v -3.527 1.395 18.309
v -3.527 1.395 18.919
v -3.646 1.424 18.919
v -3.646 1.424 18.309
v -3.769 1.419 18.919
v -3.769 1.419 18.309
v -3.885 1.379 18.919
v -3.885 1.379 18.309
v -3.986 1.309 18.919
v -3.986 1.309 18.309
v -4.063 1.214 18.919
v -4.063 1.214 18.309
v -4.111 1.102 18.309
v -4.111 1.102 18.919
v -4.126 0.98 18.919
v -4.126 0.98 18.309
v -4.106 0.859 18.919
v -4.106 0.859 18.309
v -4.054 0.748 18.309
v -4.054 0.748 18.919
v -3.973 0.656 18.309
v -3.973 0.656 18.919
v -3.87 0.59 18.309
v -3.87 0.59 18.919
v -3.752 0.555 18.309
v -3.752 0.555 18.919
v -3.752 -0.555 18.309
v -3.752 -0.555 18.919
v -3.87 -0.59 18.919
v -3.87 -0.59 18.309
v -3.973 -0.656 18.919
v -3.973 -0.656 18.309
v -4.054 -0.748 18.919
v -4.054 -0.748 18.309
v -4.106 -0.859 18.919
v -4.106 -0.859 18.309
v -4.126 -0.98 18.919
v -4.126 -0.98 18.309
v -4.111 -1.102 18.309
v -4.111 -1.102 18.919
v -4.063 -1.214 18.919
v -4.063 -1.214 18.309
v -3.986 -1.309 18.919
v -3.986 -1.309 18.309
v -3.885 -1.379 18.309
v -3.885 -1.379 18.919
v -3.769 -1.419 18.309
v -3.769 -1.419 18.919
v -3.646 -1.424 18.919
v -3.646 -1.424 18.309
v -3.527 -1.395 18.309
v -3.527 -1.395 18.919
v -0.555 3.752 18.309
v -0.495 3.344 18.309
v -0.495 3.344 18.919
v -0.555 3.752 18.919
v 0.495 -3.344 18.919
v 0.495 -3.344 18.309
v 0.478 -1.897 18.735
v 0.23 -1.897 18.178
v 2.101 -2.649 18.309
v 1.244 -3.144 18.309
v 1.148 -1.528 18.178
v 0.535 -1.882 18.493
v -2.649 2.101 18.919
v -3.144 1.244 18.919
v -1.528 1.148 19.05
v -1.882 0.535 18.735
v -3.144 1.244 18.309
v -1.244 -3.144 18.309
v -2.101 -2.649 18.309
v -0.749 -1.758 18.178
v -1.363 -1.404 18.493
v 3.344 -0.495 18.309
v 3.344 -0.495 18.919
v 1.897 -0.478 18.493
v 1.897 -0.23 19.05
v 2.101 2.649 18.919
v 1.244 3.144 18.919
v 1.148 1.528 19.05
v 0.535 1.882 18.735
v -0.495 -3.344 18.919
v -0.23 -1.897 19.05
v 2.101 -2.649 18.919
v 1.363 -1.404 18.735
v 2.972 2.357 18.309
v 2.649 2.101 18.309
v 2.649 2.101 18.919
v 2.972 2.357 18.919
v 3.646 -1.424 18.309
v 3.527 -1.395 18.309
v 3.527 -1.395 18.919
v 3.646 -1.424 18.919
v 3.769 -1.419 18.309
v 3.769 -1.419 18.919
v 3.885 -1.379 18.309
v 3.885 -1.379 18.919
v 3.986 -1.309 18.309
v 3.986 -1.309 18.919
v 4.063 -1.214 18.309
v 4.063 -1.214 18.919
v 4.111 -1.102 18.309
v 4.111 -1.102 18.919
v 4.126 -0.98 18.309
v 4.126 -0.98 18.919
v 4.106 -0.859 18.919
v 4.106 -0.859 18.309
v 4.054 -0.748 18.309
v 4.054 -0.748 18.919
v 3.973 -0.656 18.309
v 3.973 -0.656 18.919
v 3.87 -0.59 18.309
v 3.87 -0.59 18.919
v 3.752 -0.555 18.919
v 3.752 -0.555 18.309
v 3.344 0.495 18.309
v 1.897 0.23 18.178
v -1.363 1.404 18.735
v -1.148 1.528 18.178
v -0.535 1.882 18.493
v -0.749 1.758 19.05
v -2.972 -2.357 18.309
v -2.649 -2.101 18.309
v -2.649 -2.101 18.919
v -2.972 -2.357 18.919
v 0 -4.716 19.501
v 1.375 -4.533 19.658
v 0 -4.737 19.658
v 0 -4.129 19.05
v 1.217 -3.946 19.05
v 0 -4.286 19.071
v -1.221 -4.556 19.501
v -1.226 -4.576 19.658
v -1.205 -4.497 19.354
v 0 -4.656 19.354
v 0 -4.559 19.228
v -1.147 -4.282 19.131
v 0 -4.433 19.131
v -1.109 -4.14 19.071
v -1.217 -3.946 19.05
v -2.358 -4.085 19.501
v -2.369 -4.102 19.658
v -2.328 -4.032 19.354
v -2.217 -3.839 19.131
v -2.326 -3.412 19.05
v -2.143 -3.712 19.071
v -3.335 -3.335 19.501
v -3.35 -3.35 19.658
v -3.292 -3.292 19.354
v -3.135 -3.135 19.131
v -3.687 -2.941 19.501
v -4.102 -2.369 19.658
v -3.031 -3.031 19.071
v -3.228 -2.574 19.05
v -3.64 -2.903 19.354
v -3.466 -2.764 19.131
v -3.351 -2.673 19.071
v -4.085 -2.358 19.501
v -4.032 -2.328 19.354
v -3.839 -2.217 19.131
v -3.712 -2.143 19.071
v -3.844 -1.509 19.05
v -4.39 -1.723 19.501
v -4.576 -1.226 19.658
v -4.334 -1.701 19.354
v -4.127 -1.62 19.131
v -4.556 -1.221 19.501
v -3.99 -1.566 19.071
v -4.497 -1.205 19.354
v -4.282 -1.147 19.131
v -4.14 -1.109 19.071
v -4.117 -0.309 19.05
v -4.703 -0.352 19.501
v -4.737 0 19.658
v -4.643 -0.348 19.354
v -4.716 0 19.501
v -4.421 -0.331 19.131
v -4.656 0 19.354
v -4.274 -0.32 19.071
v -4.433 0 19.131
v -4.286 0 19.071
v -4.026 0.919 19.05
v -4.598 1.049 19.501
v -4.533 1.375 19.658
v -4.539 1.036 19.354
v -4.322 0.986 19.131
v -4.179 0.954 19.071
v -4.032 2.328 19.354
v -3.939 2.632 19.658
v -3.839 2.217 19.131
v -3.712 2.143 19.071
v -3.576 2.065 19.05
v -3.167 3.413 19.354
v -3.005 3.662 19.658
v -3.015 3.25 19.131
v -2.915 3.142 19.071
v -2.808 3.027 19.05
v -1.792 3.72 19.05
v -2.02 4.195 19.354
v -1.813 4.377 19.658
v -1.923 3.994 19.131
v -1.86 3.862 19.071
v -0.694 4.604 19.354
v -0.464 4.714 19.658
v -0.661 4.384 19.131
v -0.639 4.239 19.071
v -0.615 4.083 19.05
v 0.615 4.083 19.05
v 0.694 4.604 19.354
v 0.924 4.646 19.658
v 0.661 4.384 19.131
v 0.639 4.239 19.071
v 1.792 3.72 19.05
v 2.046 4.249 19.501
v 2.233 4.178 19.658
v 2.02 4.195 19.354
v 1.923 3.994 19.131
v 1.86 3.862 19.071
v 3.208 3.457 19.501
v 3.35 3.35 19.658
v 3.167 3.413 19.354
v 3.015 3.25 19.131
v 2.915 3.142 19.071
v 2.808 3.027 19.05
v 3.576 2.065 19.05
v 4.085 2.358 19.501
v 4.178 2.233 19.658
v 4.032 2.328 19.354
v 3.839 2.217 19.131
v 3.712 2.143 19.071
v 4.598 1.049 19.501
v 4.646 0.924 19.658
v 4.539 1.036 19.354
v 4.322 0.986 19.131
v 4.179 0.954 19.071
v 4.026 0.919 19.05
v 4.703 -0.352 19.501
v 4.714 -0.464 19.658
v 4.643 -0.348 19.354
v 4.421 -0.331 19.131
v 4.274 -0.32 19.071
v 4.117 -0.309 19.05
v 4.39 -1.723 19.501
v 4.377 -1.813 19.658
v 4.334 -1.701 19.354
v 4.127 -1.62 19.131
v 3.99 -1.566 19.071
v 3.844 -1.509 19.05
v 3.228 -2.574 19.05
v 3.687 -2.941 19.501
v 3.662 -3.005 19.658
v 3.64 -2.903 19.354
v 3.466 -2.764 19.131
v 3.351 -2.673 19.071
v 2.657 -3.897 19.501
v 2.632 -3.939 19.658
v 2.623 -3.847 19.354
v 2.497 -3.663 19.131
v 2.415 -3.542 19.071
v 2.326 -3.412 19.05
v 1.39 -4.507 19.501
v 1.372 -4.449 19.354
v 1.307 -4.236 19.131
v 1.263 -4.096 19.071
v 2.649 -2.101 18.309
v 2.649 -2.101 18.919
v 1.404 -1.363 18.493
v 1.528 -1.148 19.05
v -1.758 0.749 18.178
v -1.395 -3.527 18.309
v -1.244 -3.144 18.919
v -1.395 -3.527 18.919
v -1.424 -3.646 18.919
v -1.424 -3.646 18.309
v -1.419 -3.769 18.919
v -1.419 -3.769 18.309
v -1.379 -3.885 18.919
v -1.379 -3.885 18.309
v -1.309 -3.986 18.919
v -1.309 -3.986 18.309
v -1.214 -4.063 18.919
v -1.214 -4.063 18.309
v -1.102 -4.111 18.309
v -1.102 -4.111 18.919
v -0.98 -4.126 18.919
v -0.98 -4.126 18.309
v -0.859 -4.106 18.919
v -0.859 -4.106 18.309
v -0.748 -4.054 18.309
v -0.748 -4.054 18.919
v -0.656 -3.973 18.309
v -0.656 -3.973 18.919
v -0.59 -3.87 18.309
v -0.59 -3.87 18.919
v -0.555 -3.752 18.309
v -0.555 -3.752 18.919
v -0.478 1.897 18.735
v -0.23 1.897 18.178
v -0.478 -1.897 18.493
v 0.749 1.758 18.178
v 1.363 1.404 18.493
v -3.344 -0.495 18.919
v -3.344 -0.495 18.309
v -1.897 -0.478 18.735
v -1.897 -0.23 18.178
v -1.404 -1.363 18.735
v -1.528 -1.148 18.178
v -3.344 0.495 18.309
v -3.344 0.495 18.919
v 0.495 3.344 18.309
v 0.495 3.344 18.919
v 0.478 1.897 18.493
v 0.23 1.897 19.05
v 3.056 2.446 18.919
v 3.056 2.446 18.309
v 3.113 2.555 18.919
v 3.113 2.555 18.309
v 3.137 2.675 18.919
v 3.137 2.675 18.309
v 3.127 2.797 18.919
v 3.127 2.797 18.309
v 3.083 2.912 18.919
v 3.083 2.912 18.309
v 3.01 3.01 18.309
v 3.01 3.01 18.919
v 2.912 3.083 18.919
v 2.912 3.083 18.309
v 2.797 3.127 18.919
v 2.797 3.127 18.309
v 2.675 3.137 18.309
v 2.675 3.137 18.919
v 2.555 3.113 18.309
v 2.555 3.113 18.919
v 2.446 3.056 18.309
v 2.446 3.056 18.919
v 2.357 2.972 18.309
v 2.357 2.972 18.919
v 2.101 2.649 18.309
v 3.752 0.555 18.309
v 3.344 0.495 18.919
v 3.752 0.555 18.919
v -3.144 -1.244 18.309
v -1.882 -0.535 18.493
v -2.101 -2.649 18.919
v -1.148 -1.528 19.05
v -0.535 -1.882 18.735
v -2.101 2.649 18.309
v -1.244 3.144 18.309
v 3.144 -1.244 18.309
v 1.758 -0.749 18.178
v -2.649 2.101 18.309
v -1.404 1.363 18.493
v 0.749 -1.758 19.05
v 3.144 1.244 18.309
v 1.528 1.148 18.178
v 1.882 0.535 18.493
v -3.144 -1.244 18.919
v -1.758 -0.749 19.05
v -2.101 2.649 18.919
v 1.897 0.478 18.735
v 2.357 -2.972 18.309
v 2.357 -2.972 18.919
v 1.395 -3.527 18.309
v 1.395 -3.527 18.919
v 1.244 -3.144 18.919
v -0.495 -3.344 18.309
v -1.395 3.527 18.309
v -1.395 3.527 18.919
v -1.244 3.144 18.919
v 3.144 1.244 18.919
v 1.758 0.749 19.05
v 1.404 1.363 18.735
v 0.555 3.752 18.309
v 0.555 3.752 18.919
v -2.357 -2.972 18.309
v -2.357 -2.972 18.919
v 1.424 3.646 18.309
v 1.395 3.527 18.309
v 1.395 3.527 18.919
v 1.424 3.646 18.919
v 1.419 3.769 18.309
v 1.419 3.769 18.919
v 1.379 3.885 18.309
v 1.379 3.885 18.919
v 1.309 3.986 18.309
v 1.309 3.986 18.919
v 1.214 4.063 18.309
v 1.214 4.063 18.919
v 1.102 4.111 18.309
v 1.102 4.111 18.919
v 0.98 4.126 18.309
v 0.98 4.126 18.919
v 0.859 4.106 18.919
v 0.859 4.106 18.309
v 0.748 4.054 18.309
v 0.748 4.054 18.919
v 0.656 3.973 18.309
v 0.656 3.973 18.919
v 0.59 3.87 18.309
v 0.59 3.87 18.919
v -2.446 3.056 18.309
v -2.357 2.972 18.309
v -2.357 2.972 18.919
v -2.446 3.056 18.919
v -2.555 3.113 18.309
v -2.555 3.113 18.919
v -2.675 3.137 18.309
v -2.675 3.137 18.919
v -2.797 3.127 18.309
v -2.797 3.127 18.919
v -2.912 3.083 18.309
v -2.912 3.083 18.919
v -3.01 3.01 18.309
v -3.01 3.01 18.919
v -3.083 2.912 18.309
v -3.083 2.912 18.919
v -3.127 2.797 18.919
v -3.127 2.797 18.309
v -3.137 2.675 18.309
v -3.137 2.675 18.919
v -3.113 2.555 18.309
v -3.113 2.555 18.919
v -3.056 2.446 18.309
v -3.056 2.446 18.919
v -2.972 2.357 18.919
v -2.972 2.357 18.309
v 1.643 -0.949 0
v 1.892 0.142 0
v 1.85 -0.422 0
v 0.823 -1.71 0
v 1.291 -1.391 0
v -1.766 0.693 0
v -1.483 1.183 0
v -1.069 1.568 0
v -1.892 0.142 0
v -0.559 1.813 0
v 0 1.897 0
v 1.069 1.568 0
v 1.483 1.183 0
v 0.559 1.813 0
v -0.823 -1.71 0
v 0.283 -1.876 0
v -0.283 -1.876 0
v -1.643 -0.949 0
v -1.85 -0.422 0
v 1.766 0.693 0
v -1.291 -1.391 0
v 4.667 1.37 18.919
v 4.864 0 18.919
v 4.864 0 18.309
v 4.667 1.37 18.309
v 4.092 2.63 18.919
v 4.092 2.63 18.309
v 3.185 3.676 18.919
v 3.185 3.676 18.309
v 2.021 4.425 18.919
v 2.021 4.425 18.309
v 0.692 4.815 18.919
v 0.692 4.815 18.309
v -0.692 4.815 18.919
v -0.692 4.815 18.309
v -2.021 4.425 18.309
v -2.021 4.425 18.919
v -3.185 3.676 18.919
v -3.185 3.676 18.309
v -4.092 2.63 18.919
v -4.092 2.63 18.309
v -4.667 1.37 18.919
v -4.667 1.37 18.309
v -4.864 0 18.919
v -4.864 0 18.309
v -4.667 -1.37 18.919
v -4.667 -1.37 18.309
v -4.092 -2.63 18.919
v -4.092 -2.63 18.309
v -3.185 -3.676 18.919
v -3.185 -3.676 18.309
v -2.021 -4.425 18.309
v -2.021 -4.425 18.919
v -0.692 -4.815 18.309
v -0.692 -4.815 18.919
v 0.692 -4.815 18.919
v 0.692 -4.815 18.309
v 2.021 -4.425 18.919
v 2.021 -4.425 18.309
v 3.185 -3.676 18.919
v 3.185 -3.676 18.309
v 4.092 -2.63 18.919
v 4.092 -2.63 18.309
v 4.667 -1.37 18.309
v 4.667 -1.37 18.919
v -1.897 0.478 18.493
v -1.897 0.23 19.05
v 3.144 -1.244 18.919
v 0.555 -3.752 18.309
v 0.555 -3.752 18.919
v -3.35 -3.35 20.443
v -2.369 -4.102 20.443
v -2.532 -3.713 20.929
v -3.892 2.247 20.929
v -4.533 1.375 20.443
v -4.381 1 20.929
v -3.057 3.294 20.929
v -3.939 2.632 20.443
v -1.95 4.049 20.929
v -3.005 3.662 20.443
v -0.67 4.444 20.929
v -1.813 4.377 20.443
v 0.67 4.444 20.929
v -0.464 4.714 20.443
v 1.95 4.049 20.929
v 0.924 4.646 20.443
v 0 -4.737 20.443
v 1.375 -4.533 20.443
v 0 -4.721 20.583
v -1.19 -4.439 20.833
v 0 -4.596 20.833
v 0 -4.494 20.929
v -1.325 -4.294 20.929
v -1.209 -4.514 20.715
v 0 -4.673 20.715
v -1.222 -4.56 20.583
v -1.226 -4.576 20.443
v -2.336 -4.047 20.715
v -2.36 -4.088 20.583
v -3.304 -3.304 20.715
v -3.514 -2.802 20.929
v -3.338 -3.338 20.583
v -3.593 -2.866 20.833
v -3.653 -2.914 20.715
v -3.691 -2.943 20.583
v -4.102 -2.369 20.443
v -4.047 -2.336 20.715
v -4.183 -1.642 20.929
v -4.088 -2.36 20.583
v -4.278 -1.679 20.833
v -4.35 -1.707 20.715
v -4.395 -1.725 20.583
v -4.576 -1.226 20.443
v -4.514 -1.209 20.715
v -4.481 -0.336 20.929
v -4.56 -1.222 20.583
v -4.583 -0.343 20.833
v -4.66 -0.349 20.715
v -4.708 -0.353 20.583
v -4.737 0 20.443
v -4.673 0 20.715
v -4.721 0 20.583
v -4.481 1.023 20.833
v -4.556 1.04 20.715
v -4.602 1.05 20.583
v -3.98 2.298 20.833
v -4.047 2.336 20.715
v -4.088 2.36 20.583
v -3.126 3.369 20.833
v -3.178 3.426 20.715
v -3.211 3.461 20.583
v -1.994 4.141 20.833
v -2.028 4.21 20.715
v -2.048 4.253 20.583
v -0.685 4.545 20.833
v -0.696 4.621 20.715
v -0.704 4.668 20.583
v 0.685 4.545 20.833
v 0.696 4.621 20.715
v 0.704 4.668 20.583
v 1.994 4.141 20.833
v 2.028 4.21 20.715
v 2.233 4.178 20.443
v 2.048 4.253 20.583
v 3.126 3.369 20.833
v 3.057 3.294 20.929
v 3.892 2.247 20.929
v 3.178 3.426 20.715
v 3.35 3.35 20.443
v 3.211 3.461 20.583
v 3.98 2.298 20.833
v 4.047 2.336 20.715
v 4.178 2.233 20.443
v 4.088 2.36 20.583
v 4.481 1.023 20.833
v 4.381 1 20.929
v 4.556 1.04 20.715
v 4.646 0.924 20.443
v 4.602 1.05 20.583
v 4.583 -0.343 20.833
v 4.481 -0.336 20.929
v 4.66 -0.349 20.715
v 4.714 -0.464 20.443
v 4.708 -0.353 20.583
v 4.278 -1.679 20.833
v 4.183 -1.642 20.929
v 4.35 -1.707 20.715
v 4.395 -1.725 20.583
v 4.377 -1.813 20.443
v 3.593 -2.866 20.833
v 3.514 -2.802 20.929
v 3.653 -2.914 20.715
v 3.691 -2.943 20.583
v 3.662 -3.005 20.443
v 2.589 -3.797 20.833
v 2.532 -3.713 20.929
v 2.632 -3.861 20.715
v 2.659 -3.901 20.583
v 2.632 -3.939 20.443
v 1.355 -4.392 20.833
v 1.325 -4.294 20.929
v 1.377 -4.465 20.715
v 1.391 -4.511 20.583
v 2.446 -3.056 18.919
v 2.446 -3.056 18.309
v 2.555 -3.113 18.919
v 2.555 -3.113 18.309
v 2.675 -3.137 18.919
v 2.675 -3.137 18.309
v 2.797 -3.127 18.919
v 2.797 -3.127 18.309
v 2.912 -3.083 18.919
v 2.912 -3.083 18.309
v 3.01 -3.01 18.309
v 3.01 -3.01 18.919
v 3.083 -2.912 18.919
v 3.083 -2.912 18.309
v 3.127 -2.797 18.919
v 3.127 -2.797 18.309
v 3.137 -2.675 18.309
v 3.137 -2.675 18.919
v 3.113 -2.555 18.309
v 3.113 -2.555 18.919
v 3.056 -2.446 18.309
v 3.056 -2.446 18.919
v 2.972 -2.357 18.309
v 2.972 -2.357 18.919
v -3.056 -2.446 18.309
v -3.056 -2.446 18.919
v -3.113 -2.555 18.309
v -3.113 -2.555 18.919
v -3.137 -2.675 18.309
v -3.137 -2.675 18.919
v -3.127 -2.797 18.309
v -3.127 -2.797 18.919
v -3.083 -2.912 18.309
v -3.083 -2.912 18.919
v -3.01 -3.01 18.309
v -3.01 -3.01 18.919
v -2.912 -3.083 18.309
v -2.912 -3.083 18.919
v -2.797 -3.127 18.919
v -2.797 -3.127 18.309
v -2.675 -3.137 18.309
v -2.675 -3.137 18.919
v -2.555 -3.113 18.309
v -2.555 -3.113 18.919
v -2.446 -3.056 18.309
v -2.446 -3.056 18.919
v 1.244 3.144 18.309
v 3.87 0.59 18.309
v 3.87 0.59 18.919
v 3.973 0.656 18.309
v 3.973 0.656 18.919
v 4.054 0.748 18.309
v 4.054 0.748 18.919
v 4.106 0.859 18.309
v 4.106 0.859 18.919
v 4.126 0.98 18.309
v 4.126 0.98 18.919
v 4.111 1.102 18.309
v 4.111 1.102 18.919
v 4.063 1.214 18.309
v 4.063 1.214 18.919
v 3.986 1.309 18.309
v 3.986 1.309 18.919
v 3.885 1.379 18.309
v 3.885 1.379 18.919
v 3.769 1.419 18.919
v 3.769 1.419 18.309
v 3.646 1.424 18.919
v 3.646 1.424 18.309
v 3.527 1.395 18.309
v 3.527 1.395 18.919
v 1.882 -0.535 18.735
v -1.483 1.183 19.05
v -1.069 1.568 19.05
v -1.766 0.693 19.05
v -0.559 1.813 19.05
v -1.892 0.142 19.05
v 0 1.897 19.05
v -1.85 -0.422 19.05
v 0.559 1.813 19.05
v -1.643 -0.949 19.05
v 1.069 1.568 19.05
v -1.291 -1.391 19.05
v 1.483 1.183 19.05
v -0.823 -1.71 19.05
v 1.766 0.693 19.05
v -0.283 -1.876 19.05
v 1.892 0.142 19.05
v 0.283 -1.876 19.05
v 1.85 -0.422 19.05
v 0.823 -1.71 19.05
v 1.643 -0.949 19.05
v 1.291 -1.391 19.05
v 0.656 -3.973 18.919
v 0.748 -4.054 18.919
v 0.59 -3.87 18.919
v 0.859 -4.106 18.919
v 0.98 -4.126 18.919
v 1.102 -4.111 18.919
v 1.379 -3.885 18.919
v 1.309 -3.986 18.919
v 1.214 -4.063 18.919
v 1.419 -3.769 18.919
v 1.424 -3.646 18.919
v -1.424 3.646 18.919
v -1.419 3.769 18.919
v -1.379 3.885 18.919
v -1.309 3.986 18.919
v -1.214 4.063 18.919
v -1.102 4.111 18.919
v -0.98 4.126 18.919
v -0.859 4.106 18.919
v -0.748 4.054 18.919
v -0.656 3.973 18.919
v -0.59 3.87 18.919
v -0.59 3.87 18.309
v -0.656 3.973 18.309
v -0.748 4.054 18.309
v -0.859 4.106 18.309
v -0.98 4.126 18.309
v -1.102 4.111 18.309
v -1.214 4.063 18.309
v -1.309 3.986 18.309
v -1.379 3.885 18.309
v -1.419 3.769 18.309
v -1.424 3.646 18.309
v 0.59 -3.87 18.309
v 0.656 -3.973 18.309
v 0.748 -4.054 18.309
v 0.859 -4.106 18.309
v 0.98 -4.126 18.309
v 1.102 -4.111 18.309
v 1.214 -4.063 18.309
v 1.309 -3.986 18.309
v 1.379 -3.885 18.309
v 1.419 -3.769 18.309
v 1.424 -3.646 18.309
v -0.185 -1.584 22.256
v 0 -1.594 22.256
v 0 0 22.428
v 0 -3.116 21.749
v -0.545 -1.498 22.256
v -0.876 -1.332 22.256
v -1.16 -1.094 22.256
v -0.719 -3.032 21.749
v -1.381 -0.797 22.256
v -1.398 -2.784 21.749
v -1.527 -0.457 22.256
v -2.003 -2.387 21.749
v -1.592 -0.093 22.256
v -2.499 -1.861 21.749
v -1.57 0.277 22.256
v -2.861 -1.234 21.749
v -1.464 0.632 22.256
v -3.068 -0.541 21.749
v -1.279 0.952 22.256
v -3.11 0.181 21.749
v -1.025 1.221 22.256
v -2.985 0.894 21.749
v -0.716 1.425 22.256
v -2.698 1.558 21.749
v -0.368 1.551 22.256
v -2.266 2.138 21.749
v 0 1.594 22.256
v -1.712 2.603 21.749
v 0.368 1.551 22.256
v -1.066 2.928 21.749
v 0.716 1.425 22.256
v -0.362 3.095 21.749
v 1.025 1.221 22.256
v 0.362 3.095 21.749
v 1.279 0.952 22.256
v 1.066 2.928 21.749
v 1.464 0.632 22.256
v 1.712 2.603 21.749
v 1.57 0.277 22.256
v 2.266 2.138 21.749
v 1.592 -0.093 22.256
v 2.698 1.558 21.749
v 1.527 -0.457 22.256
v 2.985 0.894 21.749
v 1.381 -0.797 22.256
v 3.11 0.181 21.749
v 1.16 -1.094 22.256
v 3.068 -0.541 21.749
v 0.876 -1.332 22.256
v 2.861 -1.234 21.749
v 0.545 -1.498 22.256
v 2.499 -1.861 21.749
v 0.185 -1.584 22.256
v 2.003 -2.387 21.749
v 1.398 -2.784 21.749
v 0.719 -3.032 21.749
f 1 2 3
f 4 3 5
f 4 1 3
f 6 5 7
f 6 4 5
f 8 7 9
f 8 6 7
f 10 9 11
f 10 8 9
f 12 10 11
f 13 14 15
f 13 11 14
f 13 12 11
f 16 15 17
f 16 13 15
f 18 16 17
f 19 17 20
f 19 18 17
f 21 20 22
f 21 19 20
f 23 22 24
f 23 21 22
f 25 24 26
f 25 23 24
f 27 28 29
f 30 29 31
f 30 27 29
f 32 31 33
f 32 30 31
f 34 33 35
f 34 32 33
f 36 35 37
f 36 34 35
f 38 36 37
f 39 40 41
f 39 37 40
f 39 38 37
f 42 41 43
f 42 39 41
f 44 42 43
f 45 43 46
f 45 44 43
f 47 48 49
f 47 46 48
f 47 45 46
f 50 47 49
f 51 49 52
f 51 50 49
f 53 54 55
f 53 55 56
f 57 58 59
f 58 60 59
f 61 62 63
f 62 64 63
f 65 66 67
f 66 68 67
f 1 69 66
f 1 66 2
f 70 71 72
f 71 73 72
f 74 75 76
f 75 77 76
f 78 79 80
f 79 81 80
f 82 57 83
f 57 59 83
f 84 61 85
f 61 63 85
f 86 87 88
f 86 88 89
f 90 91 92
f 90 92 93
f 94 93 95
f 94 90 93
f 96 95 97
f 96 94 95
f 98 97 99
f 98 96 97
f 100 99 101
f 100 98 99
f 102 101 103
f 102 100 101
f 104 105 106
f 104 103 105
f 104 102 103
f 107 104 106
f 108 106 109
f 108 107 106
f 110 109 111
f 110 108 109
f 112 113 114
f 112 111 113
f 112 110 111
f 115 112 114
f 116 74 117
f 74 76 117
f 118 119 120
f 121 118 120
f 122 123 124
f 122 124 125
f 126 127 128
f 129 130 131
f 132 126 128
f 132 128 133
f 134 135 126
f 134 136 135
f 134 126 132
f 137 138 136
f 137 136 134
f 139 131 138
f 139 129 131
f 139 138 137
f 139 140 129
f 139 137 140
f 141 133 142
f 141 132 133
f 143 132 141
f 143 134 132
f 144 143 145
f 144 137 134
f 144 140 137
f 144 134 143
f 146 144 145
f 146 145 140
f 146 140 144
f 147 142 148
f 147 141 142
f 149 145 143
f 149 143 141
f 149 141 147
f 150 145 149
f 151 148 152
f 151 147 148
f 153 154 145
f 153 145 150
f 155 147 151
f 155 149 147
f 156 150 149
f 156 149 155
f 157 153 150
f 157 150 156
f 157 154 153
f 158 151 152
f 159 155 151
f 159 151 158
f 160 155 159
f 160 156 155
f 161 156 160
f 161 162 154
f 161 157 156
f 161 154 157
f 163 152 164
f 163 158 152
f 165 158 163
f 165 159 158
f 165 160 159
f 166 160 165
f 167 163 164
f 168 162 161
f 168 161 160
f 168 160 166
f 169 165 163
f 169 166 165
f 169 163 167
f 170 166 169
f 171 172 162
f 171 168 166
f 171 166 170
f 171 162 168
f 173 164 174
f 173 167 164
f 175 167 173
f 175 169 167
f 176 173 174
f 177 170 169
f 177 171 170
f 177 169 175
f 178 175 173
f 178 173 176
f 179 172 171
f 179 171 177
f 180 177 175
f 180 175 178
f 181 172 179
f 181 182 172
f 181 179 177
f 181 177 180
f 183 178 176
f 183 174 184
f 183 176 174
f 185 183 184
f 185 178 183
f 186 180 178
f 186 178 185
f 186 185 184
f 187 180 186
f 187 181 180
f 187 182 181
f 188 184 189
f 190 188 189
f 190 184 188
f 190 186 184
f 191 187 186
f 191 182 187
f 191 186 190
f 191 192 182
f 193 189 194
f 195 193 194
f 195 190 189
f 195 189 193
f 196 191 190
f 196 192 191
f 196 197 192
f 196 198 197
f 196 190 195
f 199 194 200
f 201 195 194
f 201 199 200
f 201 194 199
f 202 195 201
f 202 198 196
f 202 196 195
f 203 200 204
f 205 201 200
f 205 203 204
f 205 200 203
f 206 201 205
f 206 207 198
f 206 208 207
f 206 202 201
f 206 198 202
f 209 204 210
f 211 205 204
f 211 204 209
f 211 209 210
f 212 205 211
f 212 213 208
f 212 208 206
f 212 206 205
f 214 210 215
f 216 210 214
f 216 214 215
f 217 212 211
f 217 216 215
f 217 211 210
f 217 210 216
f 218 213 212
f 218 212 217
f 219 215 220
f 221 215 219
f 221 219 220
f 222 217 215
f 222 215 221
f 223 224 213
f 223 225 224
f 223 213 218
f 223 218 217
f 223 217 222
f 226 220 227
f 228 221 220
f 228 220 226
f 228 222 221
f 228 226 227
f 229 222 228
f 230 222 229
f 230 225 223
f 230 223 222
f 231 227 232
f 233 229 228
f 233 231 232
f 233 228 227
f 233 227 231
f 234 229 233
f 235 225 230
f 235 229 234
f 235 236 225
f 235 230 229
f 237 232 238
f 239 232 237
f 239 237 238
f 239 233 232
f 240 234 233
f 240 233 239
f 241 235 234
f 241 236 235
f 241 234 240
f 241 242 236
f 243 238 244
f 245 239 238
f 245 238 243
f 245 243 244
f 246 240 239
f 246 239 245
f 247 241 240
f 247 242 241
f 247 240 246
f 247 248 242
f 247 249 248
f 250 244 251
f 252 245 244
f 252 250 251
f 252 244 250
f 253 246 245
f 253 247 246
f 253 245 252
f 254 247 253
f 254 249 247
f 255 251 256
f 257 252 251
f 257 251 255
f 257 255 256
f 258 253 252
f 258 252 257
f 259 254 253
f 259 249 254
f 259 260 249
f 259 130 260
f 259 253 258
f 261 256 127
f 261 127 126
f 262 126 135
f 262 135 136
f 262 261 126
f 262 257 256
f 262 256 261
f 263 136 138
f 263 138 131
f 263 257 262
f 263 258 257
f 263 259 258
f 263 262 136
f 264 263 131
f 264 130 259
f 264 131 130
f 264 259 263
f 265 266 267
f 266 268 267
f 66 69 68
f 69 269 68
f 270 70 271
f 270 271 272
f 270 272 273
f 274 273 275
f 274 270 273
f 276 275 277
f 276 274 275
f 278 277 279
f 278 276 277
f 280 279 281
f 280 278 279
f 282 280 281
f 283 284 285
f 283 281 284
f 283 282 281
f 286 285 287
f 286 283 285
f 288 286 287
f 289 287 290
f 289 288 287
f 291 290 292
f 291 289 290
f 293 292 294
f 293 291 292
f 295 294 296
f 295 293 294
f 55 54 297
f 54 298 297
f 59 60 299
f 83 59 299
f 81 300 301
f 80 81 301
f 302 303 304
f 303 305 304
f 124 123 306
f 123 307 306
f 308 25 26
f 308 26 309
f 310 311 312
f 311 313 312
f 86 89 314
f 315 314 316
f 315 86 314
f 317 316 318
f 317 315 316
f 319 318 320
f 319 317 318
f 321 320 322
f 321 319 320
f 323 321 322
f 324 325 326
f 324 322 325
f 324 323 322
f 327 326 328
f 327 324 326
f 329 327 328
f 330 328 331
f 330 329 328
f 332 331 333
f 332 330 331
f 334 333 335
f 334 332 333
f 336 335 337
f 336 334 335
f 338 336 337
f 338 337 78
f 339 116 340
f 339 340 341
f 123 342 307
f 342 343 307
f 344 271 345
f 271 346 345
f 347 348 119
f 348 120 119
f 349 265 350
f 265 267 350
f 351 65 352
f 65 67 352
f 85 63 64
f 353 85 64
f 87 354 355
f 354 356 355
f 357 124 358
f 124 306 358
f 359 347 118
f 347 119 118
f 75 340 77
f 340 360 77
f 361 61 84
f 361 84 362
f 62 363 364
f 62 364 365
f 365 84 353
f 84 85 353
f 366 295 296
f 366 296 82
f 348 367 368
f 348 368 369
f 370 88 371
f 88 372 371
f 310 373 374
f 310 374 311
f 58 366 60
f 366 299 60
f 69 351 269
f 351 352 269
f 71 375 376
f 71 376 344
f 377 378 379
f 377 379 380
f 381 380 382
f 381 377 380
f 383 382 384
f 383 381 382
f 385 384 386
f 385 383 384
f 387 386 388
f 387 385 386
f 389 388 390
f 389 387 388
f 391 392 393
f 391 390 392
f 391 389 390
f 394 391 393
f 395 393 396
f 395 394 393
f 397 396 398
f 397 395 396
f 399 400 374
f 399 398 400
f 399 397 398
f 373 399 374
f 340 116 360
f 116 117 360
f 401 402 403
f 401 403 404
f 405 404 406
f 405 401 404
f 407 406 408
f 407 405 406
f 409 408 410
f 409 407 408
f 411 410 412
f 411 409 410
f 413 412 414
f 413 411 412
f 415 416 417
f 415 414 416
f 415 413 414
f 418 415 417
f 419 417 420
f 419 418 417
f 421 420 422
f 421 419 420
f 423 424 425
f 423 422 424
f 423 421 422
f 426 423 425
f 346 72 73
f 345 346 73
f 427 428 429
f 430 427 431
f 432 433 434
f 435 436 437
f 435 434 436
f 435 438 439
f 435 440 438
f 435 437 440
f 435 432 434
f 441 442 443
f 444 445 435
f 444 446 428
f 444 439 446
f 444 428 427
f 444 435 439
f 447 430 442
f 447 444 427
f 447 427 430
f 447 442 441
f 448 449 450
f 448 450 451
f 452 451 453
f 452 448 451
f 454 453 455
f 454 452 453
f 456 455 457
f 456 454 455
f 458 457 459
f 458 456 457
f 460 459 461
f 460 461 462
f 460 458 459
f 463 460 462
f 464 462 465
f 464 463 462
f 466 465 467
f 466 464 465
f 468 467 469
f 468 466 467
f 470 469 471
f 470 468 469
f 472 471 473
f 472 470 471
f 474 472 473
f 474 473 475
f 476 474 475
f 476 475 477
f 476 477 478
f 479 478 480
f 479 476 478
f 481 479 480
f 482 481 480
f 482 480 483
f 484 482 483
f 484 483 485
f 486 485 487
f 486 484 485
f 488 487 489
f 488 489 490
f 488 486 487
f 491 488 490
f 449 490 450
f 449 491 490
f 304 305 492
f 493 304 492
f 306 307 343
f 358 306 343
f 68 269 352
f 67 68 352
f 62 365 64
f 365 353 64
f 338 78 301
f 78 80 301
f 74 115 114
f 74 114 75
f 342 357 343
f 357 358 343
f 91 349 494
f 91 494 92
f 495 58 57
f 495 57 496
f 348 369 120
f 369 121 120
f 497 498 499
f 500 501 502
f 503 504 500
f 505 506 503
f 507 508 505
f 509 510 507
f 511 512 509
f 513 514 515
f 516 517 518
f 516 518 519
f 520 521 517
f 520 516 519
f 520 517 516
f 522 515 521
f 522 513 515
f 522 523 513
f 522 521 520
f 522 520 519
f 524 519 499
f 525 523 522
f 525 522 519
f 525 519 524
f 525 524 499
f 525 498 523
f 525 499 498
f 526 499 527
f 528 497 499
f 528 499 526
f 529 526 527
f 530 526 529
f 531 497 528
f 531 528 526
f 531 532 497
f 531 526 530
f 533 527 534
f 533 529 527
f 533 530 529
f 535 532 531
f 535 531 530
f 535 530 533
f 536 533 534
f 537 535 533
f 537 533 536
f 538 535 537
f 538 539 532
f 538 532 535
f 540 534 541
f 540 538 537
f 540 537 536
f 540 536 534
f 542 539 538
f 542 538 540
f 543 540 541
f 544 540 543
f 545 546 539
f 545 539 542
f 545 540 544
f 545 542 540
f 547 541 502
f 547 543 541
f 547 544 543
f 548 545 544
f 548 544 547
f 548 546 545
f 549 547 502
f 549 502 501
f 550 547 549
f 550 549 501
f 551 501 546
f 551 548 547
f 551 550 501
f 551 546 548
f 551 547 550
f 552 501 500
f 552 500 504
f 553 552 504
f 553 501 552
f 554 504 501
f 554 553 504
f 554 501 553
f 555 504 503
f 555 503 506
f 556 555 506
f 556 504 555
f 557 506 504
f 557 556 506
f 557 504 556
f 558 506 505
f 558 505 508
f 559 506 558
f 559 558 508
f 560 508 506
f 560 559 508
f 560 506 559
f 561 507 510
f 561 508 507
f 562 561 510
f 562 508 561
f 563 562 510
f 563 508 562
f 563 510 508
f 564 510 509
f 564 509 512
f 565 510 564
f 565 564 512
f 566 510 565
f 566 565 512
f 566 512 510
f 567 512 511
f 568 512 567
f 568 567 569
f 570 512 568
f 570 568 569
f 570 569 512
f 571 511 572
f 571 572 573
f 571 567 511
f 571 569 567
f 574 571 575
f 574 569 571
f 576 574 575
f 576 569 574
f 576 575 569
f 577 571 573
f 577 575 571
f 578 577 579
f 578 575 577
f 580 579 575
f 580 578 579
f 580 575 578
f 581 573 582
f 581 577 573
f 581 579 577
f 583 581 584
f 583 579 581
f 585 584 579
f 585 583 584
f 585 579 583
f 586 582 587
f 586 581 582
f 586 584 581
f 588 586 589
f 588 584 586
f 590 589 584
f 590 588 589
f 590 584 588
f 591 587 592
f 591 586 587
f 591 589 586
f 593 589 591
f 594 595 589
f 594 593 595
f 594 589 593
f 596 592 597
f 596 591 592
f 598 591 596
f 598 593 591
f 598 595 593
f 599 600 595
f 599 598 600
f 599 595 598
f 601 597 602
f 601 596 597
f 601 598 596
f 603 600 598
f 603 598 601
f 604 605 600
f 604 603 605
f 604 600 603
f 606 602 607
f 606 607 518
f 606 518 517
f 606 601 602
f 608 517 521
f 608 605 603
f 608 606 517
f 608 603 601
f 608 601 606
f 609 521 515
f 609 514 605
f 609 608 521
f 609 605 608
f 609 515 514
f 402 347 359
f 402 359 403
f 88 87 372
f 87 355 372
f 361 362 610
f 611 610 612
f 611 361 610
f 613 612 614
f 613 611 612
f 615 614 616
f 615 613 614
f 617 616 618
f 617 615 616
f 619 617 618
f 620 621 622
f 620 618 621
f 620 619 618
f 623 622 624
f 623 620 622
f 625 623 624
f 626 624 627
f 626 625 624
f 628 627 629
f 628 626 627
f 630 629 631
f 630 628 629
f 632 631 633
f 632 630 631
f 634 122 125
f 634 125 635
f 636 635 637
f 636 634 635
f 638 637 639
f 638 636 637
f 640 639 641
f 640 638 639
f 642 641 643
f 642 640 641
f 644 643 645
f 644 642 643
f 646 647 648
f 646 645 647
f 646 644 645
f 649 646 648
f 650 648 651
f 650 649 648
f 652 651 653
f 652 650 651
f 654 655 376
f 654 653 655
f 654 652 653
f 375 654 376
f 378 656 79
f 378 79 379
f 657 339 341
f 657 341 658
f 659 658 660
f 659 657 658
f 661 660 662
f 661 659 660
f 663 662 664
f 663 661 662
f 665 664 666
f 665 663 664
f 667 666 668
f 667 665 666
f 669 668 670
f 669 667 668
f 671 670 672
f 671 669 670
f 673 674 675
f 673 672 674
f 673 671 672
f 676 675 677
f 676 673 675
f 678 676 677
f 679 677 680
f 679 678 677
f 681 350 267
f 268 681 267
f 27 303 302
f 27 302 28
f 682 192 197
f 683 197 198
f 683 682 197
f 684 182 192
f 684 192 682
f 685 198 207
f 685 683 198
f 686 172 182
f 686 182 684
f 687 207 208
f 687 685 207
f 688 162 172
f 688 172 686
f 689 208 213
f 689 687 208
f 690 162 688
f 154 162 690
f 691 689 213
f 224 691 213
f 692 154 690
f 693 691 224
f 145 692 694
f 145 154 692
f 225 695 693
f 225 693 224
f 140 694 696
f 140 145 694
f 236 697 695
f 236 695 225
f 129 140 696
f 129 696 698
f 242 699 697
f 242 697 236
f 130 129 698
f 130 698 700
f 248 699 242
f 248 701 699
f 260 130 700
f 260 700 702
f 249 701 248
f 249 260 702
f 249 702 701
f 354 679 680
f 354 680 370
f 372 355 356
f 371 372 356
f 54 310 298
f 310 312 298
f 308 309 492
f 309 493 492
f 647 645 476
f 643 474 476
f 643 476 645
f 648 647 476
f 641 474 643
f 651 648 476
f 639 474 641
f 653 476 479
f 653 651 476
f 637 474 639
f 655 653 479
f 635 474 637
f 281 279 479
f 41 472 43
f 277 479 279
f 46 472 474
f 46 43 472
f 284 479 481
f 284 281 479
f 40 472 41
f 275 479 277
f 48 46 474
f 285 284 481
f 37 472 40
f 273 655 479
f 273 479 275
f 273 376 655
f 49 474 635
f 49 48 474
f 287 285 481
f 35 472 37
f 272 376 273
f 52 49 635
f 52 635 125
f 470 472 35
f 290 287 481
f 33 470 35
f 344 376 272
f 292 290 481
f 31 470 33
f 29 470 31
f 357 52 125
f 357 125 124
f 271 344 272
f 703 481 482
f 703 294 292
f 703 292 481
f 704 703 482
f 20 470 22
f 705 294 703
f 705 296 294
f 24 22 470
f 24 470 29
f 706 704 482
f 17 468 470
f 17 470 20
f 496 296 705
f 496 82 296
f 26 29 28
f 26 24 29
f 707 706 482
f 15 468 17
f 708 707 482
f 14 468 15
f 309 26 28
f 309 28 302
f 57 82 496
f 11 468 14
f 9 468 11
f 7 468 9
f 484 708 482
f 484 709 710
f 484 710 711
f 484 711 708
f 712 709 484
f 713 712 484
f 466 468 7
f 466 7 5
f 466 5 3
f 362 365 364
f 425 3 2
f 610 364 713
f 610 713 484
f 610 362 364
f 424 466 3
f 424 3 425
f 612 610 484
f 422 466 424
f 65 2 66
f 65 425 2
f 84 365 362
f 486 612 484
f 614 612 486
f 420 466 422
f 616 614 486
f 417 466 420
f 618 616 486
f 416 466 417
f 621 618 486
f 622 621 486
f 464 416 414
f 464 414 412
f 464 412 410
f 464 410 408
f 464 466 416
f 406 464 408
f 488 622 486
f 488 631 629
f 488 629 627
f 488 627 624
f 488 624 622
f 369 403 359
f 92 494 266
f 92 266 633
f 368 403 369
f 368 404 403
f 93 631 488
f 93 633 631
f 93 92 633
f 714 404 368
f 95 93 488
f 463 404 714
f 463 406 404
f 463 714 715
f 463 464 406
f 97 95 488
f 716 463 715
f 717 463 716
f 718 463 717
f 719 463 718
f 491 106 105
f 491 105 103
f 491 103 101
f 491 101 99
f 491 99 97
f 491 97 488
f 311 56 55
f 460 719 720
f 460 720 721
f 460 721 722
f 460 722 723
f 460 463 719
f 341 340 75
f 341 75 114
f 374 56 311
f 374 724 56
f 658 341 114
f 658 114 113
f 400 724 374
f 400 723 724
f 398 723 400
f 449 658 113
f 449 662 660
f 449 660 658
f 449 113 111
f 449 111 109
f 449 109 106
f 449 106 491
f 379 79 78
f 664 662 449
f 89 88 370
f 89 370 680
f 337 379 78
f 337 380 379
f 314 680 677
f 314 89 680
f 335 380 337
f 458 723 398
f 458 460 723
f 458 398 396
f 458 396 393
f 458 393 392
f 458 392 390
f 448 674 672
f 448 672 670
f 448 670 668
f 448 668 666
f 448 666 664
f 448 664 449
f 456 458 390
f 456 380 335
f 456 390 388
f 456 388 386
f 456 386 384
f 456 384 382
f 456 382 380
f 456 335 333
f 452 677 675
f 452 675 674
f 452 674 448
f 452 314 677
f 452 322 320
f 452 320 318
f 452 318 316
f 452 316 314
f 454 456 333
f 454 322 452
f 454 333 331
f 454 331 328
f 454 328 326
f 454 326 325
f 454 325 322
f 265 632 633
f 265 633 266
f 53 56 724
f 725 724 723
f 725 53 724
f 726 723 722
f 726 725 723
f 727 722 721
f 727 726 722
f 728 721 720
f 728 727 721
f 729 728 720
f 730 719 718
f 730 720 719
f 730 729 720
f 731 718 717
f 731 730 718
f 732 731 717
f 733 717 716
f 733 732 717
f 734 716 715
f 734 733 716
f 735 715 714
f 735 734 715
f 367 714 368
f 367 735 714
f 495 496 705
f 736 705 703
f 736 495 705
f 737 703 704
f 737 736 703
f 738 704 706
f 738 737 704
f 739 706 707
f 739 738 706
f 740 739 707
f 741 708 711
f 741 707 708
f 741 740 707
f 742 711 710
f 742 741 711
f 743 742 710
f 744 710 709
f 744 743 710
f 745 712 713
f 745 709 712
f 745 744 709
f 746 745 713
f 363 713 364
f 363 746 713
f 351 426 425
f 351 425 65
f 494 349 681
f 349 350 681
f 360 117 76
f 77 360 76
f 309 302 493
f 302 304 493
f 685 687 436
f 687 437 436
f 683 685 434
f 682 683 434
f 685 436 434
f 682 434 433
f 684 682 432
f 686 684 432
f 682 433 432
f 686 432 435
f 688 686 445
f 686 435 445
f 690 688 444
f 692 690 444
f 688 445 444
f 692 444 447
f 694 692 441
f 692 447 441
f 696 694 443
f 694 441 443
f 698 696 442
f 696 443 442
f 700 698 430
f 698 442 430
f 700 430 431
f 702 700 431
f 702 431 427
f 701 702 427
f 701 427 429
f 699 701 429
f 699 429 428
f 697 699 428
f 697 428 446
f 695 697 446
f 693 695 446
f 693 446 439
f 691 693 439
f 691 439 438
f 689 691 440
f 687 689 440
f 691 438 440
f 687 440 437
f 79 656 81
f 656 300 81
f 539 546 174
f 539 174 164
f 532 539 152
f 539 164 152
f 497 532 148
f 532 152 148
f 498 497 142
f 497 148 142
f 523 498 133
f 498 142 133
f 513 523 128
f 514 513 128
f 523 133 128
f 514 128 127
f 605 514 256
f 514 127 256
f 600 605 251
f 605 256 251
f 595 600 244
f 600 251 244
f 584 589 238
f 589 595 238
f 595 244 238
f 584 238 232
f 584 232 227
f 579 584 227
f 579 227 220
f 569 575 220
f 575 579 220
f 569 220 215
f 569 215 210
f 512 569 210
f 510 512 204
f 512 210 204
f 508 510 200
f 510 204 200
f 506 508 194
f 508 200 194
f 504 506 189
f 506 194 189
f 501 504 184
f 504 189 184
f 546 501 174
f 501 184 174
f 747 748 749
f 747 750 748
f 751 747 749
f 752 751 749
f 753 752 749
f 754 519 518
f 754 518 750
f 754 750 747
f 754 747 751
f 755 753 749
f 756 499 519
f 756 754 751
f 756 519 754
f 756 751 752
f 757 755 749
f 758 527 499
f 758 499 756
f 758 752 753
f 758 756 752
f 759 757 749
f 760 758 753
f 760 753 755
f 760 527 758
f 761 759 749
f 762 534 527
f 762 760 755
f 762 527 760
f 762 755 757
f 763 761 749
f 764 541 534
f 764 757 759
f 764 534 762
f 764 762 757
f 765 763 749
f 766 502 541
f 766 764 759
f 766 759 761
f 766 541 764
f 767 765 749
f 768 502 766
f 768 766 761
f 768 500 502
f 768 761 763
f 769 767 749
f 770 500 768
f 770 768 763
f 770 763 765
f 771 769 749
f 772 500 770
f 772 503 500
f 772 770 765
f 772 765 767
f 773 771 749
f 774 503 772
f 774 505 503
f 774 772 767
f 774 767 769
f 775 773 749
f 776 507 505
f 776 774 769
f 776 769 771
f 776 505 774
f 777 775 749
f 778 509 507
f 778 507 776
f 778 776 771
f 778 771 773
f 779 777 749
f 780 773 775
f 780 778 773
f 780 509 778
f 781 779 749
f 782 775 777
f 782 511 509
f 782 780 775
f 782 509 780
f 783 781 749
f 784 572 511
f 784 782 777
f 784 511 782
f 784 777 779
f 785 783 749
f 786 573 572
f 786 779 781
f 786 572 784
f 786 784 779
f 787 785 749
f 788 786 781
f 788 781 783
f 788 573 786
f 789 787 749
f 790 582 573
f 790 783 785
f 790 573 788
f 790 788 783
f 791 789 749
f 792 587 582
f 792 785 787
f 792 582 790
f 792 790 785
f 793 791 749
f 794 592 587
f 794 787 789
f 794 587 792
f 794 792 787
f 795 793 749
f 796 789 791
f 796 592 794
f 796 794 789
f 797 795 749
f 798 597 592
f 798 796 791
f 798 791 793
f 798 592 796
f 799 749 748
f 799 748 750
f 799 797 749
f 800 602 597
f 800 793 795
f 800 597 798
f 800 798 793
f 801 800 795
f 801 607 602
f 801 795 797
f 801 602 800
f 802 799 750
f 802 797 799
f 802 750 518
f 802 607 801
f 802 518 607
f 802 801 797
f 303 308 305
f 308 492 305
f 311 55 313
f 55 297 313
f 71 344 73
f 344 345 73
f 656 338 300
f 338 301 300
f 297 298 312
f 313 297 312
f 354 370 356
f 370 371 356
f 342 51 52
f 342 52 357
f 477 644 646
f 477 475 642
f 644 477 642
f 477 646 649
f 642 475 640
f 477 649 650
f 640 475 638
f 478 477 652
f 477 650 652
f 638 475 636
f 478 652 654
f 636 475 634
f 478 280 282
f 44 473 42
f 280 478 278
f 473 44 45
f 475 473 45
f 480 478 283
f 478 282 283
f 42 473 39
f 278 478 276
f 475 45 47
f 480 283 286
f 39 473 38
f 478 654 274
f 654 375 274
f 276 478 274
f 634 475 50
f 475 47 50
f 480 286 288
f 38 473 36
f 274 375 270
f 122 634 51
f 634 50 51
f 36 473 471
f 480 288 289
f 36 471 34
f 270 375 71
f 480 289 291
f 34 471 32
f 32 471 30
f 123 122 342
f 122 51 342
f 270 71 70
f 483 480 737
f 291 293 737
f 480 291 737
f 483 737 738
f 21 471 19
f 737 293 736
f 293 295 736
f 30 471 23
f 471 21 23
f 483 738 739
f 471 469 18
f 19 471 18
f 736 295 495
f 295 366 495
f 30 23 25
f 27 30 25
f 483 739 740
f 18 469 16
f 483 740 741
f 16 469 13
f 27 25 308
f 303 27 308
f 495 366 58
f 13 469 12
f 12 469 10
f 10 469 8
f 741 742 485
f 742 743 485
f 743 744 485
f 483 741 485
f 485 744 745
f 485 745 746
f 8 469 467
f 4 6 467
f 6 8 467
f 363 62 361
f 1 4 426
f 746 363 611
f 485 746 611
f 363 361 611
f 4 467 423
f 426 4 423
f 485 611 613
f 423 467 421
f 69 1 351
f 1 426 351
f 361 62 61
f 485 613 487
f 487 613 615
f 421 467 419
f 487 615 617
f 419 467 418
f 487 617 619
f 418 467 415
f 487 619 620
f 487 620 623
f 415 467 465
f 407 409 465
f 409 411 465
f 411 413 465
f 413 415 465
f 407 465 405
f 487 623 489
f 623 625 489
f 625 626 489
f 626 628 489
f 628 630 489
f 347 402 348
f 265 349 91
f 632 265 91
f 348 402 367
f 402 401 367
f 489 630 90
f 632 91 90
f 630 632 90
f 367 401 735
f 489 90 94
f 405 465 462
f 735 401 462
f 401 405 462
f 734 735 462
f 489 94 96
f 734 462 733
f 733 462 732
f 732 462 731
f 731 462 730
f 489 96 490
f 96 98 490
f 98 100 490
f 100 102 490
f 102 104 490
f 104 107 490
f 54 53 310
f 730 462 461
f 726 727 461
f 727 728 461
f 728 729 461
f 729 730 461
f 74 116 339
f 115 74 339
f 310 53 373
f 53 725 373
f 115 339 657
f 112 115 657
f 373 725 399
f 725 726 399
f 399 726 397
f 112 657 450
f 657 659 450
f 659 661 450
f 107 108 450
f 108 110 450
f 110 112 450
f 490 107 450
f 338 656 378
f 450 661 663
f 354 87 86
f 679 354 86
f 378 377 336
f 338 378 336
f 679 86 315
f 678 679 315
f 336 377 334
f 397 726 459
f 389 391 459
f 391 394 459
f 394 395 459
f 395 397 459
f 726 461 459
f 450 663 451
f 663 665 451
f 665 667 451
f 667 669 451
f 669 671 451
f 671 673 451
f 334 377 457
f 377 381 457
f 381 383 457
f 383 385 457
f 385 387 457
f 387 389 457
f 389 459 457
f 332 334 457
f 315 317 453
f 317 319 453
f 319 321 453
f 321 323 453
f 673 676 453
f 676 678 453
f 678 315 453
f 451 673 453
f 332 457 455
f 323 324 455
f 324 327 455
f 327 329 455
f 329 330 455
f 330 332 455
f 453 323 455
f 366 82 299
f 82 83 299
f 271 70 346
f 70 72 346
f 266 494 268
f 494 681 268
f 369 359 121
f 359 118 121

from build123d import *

# Parameters (mm, degrees)
SKETCH3_W          = 19.05
SKETCH3_H          = 1.897444252
SKETCH8_W          = 3.3782
SKETCH8_H          = 4.7371
SKETCH18_R         = 4.8641
SKETCH18_R_2       = 3.380772126
EXTRUDE1_DEPTH     = 0.6096
CUT_EXTRUDE2_DEPTH = 20.558681507
CIRPATTERN2_COUNT  = 12
SKETCH30_W         = 0.9896825
SKETCH30_H         = 0.6096
EXTRUDE5_DEPTH     = 0.0508
CIRPATTERN8_COUNT  = 12


with BuildPart() as part:
    # Sketch3 → Revolve1 (revolve)
    with BuildSketch(Plane(origin=(0, 0, 0), x_dir=(0, 0, -1), z_dir=(1, 0, 0))):
        with Locations((-9.525, 0.948722126)):
            Rectangle(SKETCH3_W, SKETCH3_H)
    revolve(axis=Axis((0, 0, 0), (0, 0, 1)))

    # Sketch8 → Revolve2 (revolve)
    with BuildSketch(Plane(origin=(0, 0, 0), x_dir=(0, 0, -1), z_dir=(1, 0, 0))):
        with Locations((-20.7391, 2.36855)):
            Rectangle(SKETCH8_W, SKETCH8_H)
    revolve(axis=Axis((0, 0, 0), (0, 0, 1)))

    # Sketch11 → Cut-Revolve3 (revolve, cut)
    with BuildSketch(Plane(origin=(0, 0, 0), x_dir=(0, 0, -1), z_dir=(1, 0, 0))):
        with BuildLine():
            Line((-20.443130449, 4.7371), (-19.658076, 4.7371))
            ThreePointArc((-19.658076, 4.7371), (-19.228101337, 4.558998663), (-19.05, 4.129024))
            Line((-19.05, 4.129024), (-18.415, 4.129024))
            Line((-18.415, 4.129024), (-18.415, 5.3721))
            Line((-18.415, 5.3721), (-23.0632, 5.3721))
            Line((-23.0632, 5.3721), (-23.0632, 0))
            Line((-23.0632, 0), (-22.4282, 0))
            ThreePointArc((-22.4282, 0), (-22.043646213, 2.368662391), (-20.929487499, 4.494007892))
            ThreePointArc((-20.929487499, 4.494007892), (-20.714992985, 4.672942361), (-20.443130449, 4.7371))
        make_face()
    revolve(axis=Axis((0, 0, 22.4282), (0, 0, -1)), mode=Mode.SUBTRACT)


with BuildPart() as body_2:
    # Sketch18 → Extrude1 (new body)
    with BuildSketch(Plane.XY.offset(18.918698413)):
        Circle(SKETCH18_R)
        Circle(SKETCH18_R_2, mode=Mode.SUBTRACT)
    extrude(amount=-EXTRUDE1_DEPTH)

    # Sketch19 → Cut-Extrude2 (cut, through all)
    with BuildSketch(Plane(origin=(0, 0, 18.309098413), x_dir=(-1, 0, 0), z_dir=(0, 0, -1))):
        with BuildLine():
            Line((1.395327488, 3.527176728), (0, 0))
            Line((0, 0), (0.555199312, 3.752288394))
            ThreePointArc((0.555199312, 3.752288394), (1.101556503, 4.111064835), (1.395327488, 3.527176728))
        make_face()
    cut_extrude2 = extrude(amount=-CUT_EXTRUDE2_DEPTH, mode=Mode.SUBTRACT)

    # CirPattern2: Cut-Extrude2 ×12 about axis
    cirpattern2_axis = Axis((0, 0, 0), (0, 0, -1))
    for i in range(1, CIRPATTERN2_COUNT):
        add(cut_extrude2.rotate(cirpattern2_axis, i * 360 / CIRPATTERN2_COUNT), mode=Mode.SUBTRACT)


with BuildPart() as body_3:
    # Sketch25 → Loft4 section 0
    with BuildSketch(Plane(origin=(0, 3.34436127, 0), x_dir=(-1, 0, 0), z_dir=(0, 1, 0))):
        with BuildLine():
            Line((-0.49484125, 18.309098413), (0.49484125, 18.309098413))
            Line((0.49484125, 18.309098413), (0.49484125, 18.918698413))
            Line((0.49484125, 18.918698413), (-0.49484125, 18.918698413))
            Line((-0.49484125, 18.918698413), (-0.49484125, 18.309098413))
        make_face()
    # Sketch26 → Loft4 section 1
    with BuildSketch(Plane(origin=(0, 1.897444252, 0), x_dir=(-1, 0, 0), z_dir=(0, 1, 0))):
        with BuildLine():
            Line((-0.478067611, 18.493102689), (-0.230120954, 19.05))
            Line((-0.230120954, 19.05), (0.478067611, 18.734694136))
            Line((0.478067611, 18.734694136), (0.230120954, 18.177796825))
            Line((0.230120954, 18.177796825), (-0.478067611, 18.493102689))
        make_face()
    loft()


with BuildPart() as body_4:
    # Sketch30 → Extrude5 (new body)
    with BuildSketch(Plane(origin=(0, 3.34436127, 0), x_dir=(-1, 0, 0), z_dir=(0, 1, 0))):
        with Locations((0, 18.613898413)):
            Rectangle(SKETCH30_W, SKETCH30_H)
    extrude(amount=EXTRUDE5_DEPTH)


with BuildPart() as cirpattern8_1:
    # CirPattern8: pattern copy
    add(body_4.part.rotate(Axis((0, 0, 0), (0, 0, -1)), 1 * 360 / CIRPATTERN8_COUNT))


with BuildPart() as cirpattern8_2:
    # CirPattern8: pattern copy
    add(body_4.part.rotate(Axis((0, 0, 0), (0, 0, -1)), 2 * 360 / CIRPATTERN8_COUNT))


with BuildPart() as cirpattern8_3:
    # CirPattern8: pattern copy
    add(body_4.part.rotate(Axis((0, 0, 0), (0, 0, -1)), 3 * 360 / CIRPATTERN8_COUNT))


with BuildPart() as cirpattern8_4:
    # CirPattern8: pattern copy
    add(body_4.part.rotate(Axis((0, 0, 0), (0, 0, -1)), 4 * 360 / CIRPATTERN8_COUNT))


with BuildPart() as cirpattern8_5:
    # CirPattern8: pattern copy
    add(body_4.part.rotate(Axis((0, 0, 0), (0, 0, -1)), 5 * 360 / CIRPATTERN8_COUNT))


with BuildPart() as cirpattern8_6:
    # CirPattern8: pattern copy
    add(body_4.part.rotate(Axis((0, 0, 0), (0, 0, -1)), 6 * 360 / CIRPATTERN8_COUNT))


with BuildPart() as cirpattern8_7:
    # CirPattern8: pattern copy
    add(body_4.part.rotate(Axis((0, 0, 0), (0, 0, -1)), 7 * 360 / CIRPATTERN8_COUNT))


with BuildPart() as cirpattern8_8:
    # CirPattern8: pattern copy
    add(body_4.part.rotate(Axis((0, 0, 0), (0, 0, -1)), 8 * 360 / CIRPATTERN8_COUNT))


with BuildPart() as cirpattern8_9:
    # CirPattern8: pattern copy
    add(body_4.part.rotate(Axis((0, 0, 0), (0, 0, -1)), 9 * 360 / CIRPATTERN8_COUNT))


with BuildPart() as cirpattern8_10:
    # CirPattern8: pattern copy
    add(body_4.part.rotate(Axis((0, 0, 0), (0, 0, -1)), 10 * 360 / CIRPATTERN8_COUNT))


with BuildPart() as cirpattern8_11:
    # CirPattern8: pattern copy
    add(body_4.part.rotate(Axis((0, 0, 0), (0, 0, -1)), 11 * 360 / CIRPATTERN8_COUNT))


with BuildPart() as cirpattern8_12:
    # CirPattern8: pattern copy
    add(body_3.part.rotate(Axis((0, 0, 0), (0, 0, -1)), 1 * 360 / CIRPATTERN8_COUNT))


with BuildPart() as cirpattern8_13:
    # CirPattern8: pattern copy
    add(body_3.part.rotate(Axis((0, 0, 0), (0, 0, -1)), 2 * 360 / CIRPATTERN8_COUNT))


with BuildPart() as cirpattern8_14:
    # CirPattern8: pattern copy
    add(body_3.part.rotate(Axis((0, 0, 0), (0, 0, -1)), 3 * 360 / CIRPATTERN8_COUNT))


with BuildPart() as cirpattern8_15:
    # CirPattern8: pattern copy
    add(body_3.part.rotate(Axis((0, 0, 0), (0, 0, -1)), 4 * 360 / CIRPATTERN8_COUNT))


with BuildPart() as cirpattern8_16:
    # CirPattern8: pattern copy
    add(body_3.part.rotate(Axis((0, 0, 0), (0, 0, -1)), 5 * 360 / CIRPATTERN8_COUNT))


with BuildPart() as cirpattern8_17:
    # CirPattern8: pattern copy
    add(body_3.part.rotate(Axis((0, 0, 0), (0, 0, -1)), 6 * 360 / CIRPATTERN8_COUNT))


with BuildPart() as cirpattern8_18:
    # CirPattern8: pattern copy
    add(body_3.part.rotate(Axis((0, 0, 0), (0, 0, -1)), 7 * 360 / CIRPATTERN8_COUNT))


with BuildPart() as cirpattern8_19:
    # CirPattern8: pattern copy
    add(body_3.part.rotate(Axis((0, 0, 0), (0, 0, -1)), 8 * 360 / CIRPATTERN8_COUNT))


with BuildPart() as cirpattern8_20:
    # CirPattern8: pattern copy
    add(body_3.part.rotate(Axis((0, 0, 0), (0, 0, -1)), 9 * 360 / CIRPATTERN8_COUNT))


with BuildPart() as cirpattern8_21:
    # CirPattern8: pattern copy
    add(body_3.part.rotate(Axis((0, 0, 0), (0, 0, -1)), 10 * 360 / CIRPATTERN8_COUNT))


with BuildPart() as cirpattern8_22:
    # CirPattern8: pattern copy
    add(body_3.part.rotate(Axis((0, 0, 0), (0, 0, -1)), 11 * 360 / CIRPATTERN8_COUNT))


with BuildPart() as body_3_1:
    add(body_3.part)

    # Combine2: union body 4, CirPattern8_11, CirPattern8_10, CirPattern8_9, CirPattern8_8, CirPattern8_7, CirPattern8_6, CirPattern8_5, CirPattern8_4, CirPattern8_3, CirPattern8_2, CirPattern8_1, CirPattern8_22, CirPattern8_21, CirPattern8_20, CirPattern8_19, CirPattern8_18, CirPattern8_17, CirPattern8_16, CirPattern8_15, CirPattern8_14, CirPattern8_13, CirPattern8_12, body 2
    add(body_4.part)
    add(cirpattern8_11.part)
    add(cirpattern8_10.part)
    add(cirpattern8_9.part)
    add(cirpattern8_8.part)
    add(cirpattern8_7.part)
    add(cirpattern8_6.part)
    add(cirpattern8_5.part)
    add(cirpattern8_4.part)
    add(cirpattern8_3.part)
    add(cirpattern8_2.part)
    add(cirpattern8_1.part)
    add(cirpattern8_22.part)
    add(cirpattern8_21.part)
    add(cirpattern8_20.part)
    add(cirpattern8_19.part)
    add(cirpattern8_18.part)
    add(cirpattern8_17.part)
    add(cirpattern8_16.part)
    add(cirpattern8_15.part)
    add(cirpattern8_14.part)
    add(cirpattern8_13.part)
    add(cirpattern8_12.part)
    add(body_2.part)


solid = Compound([part.part, body_3_1.part])
